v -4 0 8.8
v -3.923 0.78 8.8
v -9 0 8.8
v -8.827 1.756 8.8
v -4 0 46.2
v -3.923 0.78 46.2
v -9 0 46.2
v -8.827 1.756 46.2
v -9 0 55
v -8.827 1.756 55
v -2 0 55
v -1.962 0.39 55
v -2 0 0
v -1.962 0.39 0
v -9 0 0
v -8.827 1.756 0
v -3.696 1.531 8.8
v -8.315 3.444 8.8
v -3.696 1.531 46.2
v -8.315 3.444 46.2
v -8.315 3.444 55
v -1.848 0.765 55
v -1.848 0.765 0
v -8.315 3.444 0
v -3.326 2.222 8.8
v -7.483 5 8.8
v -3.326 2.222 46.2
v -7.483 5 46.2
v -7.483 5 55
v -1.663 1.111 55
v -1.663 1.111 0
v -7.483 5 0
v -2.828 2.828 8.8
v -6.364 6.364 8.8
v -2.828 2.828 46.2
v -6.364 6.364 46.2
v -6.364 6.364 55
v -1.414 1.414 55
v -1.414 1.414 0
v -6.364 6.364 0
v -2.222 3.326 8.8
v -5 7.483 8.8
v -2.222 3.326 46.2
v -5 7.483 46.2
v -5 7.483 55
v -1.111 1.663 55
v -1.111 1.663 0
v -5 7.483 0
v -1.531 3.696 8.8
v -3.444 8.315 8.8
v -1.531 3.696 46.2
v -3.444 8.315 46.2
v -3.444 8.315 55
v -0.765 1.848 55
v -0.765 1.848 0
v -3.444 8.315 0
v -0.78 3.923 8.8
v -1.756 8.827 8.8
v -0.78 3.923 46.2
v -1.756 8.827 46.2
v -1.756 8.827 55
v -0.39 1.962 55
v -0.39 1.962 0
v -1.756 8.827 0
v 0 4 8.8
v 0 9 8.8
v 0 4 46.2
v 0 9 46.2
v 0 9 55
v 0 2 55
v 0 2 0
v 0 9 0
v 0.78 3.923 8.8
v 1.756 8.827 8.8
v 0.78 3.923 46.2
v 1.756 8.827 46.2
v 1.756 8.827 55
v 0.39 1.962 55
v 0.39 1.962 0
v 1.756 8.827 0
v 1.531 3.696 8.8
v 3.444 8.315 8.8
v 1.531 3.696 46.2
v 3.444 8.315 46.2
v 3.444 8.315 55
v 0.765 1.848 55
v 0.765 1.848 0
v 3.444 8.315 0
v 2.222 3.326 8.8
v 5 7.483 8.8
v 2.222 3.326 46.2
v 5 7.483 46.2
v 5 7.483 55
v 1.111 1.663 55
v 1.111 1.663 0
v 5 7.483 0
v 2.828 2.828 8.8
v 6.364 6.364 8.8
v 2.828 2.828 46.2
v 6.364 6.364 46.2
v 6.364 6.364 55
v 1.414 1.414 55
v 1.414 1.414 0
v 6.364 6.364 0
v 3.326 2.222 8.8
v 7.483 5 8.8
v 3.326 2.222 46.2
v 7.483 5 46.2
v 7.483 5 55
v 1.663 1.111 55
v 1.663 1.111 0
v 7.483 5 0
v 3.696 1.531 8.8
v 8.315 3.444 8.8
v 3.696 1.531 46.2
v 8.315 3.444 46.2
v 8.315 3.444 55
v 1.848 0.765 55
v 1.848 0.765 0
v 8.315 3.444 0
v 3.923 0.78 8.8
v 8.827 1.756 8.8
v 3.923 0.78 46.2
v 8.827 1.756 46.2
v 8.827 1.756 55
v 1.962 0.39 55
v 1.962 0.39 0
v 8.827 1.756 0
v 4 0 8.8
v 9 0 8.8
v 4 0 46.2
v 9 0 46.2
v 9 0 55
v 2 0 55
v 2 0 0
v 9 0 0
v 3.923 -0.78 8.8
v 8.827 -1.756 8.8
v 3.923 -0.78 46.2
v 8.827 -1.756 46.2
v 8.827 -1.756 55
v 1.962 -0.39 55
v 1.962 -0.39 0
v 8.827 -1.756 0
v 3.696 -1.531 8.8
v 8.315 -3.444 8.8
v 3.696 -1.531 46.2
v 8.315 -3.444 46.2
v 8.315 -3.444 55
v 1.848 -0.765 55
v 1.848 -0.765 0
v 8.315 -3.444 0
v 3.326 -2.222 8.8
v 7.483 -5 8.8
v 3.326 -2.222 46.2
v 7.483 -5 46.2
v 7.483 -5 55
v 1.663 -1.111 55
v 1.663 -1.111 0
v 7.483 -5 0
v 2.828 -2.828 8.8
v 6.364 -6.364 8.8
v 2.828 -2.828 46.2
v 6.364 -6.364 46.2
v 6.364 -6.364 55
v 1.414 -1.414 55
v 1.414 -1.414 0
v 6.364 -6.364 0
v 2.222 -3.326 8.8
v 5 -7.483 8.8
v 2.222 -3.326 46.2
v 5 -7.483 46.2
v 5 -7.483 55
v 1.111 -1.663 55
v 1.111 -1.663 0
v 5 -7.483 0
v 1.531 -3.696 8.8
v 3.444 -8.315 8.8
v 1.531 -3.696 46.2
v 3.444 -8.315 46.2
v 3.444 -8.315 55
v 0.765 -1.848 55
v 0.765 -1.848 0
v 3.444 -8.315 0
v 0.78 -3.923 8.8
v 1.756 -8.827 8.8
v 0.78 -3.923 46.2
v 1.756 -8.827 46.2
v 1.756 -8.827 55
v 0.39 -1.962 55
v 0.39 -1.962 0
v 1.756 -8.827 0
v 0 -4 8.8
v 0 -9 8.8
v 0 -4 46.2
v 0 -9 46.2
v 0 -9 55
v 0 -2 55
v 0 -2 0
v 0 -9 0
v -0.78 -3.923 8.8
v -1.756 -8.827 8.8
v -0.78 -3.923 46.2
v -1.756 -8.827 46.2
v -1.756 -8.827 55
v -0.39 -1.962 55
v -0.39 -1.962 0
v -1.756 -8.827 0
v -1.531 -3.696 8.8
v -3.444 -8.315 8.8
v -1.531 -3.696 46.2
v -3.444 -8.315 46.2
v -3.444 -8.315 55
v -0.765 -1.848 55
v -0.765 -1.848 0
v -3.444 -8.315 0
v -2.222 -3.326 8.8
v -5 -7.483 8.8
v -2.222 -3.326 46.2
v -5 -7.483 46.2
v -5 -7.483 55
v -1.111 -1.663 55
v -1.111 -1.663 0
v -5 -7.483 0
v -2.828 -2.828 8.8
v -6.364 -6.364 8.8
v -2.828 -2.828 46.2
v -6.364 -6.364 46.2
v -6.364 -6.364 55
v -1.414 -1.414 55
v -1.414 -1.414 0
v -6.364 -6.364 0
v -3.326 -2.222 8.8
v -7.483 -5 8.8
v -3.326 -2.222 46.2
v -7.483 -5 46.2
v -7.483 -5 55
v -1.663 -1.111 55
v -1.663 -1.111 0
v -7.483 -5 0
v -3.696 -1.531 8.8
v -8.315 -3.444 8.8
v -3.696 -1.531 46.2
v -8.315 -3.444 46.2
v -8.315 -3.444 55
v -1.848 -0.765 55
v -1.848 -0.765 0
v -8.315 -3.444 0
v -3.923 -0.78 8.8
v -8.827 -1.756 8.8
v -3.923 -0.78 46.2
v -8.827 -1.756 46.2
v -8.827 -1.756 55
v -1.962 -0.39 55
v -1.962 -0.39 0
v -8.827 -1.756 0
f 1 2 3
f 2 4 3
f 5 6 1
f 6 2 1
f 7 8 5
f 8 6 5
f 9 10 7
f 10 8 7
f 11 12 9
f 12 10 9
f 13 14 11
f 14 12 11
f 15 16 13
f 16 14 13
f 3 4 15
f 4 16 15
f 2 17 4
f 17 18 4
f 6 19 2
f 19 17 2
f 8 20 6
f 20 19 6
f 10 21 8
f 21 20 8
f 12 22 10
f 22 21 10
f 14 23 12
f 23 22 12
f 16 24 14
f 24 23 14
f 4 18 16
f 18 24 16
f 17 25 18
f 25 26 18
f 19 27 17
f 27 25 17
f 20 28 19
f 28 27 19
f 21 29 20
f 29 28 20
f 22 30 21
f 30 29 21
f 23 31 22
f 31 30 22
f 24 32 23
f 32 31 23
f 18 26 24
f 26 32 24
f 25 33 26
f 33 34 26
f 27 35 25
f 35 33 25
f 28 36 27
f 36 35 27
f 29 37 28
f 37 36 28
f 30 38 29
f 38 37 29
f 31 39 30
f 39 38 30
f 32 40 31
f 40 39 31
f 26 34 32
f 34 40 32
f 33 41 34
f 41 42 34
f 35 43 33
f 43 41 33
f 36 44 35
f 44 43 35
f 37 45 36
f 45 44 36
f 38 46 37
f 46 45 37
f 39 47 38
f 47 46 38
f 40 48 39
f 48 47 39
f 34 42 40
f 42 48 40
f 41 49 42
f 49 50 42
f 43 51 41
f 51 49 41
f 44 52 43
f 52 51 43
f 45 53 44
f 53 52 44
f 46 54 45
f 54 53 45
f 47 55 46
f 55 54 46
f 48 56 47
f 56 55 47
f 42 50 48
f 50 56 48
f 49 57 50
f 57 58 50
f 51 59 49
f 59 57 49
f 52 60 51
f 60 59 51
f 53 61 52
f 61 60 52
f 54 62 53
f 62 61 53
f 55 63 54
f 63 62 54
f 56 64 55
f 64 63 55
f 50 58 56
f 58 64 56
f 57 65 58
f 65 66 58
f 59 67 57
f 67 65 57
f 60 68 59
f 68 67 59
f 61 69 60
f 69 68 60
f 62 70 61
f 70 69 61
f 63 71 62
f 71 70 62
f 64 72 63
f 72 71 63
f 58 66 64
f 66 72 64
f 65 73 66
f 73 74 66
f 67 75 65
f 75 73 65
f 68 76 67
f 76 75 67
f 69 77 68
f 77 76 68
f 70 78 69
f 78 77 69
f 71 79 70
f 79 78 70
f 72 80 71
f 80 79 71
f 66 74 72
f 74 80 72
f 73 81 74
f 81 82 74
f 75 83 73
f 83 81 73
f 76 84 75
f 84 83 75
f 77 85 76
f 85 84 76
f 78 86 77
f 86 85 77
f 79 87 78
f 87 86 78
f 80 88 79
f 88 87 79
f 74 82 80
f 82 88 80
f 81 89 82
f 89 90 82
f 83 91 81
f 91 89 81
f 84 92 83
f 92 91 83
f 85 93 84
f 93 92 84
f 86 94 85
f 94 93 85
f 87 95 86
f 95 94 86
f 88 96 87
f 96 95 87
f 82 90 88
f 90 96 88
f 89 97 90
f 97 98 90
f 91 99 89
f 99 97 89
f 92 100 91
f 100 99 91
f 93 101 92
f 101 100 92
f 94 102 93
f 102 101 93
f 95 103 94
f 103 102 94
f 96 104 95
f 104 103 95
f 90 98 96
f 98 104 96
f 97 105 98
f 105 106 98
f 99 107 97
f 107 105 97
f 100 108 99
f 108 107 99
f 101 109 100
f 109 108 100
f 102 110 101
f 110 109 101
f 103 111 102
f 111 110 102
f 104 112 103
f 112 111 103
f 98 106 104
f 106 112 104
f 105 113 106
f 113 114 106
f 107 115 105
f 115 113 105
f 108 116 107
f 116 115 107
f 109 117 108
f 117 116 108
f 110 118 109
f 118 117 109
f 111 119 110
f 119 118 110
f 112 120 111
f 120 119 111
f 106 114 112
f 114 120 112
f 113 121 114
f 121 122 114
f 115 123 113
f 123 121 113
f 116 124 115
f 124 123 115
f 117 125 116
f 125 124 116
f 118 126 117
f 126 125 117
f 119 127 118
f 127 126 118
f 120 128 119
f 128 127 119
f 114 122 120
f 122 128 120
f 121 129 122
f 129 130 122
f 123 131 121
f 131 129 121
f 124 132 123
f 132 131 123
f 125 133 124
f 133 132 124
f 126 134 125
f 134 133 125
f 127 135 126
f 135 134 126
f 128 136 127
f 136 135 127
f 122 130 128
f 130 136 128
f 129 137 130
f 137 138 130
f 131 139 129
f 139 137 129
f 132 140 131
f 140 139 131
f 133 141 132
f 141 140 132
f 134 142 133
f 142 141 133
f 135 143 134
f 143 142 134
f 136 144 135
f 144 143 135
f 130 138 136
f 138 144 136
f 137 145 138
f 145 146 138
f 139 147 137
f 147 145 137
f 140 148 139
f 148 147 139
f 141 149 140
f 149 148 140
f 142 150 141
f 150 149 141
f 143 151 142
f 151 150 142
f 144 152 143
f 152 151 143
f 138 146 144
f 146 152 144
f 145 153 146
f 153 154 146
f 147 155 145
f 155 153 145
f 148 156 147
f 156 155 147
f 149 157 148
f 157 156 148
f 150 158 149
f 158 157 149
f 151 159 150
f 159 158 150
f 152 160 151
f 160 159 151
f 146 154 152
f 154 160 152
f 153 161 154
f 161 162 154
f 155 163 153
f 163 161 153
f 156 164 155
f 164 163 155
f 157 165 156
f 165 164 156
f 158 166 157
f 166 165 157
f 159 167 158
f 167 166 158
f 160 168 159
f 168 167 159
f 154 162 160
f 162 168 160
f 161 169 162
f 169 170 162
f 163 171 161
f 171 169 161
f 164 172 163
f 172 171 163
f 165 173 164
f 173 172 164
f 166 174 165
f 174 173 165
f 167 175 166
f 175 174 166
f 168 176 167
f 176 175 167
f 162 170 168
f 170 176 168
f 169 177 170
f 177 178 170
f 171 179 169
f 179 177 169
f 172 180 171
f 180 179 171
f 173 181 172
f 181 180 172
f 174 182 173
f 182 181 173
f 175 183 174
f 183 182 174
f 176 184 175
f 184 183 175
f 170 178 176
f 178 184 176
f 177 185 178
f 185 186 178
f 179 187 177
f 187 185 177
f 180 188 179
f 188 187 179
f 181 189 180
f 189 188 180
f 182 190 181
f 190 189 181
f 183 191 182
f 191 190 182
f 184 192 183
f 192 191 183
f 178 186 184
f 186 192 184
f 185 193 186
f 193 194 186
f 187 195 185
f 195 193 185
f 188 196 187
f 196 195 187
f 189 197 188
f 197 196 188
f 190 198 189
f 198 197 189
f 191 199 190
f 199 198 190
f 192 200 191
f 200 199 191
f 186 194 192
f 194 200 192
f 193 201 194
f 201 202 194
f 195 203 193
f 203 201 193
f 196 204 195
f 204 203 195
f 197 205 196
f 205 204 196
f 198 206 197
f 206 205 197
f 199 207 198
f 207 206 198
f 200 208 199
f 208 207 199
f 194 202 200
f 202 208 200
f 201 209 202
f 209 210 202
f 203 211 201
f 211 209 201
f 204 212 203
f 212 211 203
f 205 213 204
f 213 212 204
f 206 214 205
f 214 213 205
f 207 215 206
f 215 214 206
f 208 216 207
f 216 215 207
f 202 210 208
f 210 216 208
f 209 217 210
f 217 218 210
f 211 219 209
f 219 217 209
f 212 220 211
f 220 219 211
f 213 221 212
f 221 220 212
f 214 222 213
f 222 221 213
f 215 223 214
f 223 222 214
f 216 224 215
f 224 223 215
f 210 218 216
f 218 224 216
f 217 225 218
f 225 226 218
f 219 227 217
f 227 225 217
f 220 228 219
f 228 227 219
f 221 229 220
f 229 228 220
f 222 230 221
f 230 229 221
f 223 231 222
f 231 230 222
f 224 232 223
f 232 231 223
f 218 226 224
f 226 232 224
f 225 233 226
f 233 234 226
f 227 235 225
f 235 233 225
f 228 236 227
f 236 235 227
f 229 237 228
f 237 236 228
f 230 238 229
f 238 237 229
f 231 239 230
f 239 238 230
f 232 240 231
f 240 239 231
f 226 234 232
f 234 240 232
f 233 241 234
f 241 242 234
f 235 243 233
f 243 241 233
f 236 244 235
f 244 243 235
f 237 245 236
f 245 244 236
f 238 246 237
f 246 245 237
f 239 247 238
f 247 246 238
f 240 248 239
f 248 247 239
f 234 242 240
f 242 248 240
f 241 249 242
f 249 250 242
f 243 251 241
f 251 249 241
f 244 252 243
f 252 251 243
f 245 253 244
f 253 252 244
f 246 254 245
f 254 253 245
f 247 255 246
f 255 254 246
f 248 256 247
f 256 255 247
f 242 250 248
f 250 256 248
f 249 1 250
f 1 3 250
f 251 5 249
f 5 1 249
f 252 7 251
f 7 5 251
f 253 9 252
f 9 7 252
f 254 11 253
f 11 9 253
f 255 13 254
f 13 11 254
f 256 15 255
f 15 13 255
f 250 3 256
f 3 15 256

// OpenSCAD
$fn = 32;

// ----------------------------------------------------------------------
// Profiled standoff: spool spacer, 55 mm long, bore 4 mm
// ----------------------------------------------------------------------

// --- parameters (mm) ---
revolve_angle = 360;      // full turn around the Z axis
profile_points = 8;       // points of the closed outline

profile = [[2, 0], [9, 0], [9, 8.8], [4, 8.8], [4, 46.2], [9, 46.2], [9, 55], [2, 55]];  // single closed polygon, 8 points, counter clockwise

// --- the one profile operation ---
rotate_extrude(angle = revolve_angle) polygon(points = profile);
